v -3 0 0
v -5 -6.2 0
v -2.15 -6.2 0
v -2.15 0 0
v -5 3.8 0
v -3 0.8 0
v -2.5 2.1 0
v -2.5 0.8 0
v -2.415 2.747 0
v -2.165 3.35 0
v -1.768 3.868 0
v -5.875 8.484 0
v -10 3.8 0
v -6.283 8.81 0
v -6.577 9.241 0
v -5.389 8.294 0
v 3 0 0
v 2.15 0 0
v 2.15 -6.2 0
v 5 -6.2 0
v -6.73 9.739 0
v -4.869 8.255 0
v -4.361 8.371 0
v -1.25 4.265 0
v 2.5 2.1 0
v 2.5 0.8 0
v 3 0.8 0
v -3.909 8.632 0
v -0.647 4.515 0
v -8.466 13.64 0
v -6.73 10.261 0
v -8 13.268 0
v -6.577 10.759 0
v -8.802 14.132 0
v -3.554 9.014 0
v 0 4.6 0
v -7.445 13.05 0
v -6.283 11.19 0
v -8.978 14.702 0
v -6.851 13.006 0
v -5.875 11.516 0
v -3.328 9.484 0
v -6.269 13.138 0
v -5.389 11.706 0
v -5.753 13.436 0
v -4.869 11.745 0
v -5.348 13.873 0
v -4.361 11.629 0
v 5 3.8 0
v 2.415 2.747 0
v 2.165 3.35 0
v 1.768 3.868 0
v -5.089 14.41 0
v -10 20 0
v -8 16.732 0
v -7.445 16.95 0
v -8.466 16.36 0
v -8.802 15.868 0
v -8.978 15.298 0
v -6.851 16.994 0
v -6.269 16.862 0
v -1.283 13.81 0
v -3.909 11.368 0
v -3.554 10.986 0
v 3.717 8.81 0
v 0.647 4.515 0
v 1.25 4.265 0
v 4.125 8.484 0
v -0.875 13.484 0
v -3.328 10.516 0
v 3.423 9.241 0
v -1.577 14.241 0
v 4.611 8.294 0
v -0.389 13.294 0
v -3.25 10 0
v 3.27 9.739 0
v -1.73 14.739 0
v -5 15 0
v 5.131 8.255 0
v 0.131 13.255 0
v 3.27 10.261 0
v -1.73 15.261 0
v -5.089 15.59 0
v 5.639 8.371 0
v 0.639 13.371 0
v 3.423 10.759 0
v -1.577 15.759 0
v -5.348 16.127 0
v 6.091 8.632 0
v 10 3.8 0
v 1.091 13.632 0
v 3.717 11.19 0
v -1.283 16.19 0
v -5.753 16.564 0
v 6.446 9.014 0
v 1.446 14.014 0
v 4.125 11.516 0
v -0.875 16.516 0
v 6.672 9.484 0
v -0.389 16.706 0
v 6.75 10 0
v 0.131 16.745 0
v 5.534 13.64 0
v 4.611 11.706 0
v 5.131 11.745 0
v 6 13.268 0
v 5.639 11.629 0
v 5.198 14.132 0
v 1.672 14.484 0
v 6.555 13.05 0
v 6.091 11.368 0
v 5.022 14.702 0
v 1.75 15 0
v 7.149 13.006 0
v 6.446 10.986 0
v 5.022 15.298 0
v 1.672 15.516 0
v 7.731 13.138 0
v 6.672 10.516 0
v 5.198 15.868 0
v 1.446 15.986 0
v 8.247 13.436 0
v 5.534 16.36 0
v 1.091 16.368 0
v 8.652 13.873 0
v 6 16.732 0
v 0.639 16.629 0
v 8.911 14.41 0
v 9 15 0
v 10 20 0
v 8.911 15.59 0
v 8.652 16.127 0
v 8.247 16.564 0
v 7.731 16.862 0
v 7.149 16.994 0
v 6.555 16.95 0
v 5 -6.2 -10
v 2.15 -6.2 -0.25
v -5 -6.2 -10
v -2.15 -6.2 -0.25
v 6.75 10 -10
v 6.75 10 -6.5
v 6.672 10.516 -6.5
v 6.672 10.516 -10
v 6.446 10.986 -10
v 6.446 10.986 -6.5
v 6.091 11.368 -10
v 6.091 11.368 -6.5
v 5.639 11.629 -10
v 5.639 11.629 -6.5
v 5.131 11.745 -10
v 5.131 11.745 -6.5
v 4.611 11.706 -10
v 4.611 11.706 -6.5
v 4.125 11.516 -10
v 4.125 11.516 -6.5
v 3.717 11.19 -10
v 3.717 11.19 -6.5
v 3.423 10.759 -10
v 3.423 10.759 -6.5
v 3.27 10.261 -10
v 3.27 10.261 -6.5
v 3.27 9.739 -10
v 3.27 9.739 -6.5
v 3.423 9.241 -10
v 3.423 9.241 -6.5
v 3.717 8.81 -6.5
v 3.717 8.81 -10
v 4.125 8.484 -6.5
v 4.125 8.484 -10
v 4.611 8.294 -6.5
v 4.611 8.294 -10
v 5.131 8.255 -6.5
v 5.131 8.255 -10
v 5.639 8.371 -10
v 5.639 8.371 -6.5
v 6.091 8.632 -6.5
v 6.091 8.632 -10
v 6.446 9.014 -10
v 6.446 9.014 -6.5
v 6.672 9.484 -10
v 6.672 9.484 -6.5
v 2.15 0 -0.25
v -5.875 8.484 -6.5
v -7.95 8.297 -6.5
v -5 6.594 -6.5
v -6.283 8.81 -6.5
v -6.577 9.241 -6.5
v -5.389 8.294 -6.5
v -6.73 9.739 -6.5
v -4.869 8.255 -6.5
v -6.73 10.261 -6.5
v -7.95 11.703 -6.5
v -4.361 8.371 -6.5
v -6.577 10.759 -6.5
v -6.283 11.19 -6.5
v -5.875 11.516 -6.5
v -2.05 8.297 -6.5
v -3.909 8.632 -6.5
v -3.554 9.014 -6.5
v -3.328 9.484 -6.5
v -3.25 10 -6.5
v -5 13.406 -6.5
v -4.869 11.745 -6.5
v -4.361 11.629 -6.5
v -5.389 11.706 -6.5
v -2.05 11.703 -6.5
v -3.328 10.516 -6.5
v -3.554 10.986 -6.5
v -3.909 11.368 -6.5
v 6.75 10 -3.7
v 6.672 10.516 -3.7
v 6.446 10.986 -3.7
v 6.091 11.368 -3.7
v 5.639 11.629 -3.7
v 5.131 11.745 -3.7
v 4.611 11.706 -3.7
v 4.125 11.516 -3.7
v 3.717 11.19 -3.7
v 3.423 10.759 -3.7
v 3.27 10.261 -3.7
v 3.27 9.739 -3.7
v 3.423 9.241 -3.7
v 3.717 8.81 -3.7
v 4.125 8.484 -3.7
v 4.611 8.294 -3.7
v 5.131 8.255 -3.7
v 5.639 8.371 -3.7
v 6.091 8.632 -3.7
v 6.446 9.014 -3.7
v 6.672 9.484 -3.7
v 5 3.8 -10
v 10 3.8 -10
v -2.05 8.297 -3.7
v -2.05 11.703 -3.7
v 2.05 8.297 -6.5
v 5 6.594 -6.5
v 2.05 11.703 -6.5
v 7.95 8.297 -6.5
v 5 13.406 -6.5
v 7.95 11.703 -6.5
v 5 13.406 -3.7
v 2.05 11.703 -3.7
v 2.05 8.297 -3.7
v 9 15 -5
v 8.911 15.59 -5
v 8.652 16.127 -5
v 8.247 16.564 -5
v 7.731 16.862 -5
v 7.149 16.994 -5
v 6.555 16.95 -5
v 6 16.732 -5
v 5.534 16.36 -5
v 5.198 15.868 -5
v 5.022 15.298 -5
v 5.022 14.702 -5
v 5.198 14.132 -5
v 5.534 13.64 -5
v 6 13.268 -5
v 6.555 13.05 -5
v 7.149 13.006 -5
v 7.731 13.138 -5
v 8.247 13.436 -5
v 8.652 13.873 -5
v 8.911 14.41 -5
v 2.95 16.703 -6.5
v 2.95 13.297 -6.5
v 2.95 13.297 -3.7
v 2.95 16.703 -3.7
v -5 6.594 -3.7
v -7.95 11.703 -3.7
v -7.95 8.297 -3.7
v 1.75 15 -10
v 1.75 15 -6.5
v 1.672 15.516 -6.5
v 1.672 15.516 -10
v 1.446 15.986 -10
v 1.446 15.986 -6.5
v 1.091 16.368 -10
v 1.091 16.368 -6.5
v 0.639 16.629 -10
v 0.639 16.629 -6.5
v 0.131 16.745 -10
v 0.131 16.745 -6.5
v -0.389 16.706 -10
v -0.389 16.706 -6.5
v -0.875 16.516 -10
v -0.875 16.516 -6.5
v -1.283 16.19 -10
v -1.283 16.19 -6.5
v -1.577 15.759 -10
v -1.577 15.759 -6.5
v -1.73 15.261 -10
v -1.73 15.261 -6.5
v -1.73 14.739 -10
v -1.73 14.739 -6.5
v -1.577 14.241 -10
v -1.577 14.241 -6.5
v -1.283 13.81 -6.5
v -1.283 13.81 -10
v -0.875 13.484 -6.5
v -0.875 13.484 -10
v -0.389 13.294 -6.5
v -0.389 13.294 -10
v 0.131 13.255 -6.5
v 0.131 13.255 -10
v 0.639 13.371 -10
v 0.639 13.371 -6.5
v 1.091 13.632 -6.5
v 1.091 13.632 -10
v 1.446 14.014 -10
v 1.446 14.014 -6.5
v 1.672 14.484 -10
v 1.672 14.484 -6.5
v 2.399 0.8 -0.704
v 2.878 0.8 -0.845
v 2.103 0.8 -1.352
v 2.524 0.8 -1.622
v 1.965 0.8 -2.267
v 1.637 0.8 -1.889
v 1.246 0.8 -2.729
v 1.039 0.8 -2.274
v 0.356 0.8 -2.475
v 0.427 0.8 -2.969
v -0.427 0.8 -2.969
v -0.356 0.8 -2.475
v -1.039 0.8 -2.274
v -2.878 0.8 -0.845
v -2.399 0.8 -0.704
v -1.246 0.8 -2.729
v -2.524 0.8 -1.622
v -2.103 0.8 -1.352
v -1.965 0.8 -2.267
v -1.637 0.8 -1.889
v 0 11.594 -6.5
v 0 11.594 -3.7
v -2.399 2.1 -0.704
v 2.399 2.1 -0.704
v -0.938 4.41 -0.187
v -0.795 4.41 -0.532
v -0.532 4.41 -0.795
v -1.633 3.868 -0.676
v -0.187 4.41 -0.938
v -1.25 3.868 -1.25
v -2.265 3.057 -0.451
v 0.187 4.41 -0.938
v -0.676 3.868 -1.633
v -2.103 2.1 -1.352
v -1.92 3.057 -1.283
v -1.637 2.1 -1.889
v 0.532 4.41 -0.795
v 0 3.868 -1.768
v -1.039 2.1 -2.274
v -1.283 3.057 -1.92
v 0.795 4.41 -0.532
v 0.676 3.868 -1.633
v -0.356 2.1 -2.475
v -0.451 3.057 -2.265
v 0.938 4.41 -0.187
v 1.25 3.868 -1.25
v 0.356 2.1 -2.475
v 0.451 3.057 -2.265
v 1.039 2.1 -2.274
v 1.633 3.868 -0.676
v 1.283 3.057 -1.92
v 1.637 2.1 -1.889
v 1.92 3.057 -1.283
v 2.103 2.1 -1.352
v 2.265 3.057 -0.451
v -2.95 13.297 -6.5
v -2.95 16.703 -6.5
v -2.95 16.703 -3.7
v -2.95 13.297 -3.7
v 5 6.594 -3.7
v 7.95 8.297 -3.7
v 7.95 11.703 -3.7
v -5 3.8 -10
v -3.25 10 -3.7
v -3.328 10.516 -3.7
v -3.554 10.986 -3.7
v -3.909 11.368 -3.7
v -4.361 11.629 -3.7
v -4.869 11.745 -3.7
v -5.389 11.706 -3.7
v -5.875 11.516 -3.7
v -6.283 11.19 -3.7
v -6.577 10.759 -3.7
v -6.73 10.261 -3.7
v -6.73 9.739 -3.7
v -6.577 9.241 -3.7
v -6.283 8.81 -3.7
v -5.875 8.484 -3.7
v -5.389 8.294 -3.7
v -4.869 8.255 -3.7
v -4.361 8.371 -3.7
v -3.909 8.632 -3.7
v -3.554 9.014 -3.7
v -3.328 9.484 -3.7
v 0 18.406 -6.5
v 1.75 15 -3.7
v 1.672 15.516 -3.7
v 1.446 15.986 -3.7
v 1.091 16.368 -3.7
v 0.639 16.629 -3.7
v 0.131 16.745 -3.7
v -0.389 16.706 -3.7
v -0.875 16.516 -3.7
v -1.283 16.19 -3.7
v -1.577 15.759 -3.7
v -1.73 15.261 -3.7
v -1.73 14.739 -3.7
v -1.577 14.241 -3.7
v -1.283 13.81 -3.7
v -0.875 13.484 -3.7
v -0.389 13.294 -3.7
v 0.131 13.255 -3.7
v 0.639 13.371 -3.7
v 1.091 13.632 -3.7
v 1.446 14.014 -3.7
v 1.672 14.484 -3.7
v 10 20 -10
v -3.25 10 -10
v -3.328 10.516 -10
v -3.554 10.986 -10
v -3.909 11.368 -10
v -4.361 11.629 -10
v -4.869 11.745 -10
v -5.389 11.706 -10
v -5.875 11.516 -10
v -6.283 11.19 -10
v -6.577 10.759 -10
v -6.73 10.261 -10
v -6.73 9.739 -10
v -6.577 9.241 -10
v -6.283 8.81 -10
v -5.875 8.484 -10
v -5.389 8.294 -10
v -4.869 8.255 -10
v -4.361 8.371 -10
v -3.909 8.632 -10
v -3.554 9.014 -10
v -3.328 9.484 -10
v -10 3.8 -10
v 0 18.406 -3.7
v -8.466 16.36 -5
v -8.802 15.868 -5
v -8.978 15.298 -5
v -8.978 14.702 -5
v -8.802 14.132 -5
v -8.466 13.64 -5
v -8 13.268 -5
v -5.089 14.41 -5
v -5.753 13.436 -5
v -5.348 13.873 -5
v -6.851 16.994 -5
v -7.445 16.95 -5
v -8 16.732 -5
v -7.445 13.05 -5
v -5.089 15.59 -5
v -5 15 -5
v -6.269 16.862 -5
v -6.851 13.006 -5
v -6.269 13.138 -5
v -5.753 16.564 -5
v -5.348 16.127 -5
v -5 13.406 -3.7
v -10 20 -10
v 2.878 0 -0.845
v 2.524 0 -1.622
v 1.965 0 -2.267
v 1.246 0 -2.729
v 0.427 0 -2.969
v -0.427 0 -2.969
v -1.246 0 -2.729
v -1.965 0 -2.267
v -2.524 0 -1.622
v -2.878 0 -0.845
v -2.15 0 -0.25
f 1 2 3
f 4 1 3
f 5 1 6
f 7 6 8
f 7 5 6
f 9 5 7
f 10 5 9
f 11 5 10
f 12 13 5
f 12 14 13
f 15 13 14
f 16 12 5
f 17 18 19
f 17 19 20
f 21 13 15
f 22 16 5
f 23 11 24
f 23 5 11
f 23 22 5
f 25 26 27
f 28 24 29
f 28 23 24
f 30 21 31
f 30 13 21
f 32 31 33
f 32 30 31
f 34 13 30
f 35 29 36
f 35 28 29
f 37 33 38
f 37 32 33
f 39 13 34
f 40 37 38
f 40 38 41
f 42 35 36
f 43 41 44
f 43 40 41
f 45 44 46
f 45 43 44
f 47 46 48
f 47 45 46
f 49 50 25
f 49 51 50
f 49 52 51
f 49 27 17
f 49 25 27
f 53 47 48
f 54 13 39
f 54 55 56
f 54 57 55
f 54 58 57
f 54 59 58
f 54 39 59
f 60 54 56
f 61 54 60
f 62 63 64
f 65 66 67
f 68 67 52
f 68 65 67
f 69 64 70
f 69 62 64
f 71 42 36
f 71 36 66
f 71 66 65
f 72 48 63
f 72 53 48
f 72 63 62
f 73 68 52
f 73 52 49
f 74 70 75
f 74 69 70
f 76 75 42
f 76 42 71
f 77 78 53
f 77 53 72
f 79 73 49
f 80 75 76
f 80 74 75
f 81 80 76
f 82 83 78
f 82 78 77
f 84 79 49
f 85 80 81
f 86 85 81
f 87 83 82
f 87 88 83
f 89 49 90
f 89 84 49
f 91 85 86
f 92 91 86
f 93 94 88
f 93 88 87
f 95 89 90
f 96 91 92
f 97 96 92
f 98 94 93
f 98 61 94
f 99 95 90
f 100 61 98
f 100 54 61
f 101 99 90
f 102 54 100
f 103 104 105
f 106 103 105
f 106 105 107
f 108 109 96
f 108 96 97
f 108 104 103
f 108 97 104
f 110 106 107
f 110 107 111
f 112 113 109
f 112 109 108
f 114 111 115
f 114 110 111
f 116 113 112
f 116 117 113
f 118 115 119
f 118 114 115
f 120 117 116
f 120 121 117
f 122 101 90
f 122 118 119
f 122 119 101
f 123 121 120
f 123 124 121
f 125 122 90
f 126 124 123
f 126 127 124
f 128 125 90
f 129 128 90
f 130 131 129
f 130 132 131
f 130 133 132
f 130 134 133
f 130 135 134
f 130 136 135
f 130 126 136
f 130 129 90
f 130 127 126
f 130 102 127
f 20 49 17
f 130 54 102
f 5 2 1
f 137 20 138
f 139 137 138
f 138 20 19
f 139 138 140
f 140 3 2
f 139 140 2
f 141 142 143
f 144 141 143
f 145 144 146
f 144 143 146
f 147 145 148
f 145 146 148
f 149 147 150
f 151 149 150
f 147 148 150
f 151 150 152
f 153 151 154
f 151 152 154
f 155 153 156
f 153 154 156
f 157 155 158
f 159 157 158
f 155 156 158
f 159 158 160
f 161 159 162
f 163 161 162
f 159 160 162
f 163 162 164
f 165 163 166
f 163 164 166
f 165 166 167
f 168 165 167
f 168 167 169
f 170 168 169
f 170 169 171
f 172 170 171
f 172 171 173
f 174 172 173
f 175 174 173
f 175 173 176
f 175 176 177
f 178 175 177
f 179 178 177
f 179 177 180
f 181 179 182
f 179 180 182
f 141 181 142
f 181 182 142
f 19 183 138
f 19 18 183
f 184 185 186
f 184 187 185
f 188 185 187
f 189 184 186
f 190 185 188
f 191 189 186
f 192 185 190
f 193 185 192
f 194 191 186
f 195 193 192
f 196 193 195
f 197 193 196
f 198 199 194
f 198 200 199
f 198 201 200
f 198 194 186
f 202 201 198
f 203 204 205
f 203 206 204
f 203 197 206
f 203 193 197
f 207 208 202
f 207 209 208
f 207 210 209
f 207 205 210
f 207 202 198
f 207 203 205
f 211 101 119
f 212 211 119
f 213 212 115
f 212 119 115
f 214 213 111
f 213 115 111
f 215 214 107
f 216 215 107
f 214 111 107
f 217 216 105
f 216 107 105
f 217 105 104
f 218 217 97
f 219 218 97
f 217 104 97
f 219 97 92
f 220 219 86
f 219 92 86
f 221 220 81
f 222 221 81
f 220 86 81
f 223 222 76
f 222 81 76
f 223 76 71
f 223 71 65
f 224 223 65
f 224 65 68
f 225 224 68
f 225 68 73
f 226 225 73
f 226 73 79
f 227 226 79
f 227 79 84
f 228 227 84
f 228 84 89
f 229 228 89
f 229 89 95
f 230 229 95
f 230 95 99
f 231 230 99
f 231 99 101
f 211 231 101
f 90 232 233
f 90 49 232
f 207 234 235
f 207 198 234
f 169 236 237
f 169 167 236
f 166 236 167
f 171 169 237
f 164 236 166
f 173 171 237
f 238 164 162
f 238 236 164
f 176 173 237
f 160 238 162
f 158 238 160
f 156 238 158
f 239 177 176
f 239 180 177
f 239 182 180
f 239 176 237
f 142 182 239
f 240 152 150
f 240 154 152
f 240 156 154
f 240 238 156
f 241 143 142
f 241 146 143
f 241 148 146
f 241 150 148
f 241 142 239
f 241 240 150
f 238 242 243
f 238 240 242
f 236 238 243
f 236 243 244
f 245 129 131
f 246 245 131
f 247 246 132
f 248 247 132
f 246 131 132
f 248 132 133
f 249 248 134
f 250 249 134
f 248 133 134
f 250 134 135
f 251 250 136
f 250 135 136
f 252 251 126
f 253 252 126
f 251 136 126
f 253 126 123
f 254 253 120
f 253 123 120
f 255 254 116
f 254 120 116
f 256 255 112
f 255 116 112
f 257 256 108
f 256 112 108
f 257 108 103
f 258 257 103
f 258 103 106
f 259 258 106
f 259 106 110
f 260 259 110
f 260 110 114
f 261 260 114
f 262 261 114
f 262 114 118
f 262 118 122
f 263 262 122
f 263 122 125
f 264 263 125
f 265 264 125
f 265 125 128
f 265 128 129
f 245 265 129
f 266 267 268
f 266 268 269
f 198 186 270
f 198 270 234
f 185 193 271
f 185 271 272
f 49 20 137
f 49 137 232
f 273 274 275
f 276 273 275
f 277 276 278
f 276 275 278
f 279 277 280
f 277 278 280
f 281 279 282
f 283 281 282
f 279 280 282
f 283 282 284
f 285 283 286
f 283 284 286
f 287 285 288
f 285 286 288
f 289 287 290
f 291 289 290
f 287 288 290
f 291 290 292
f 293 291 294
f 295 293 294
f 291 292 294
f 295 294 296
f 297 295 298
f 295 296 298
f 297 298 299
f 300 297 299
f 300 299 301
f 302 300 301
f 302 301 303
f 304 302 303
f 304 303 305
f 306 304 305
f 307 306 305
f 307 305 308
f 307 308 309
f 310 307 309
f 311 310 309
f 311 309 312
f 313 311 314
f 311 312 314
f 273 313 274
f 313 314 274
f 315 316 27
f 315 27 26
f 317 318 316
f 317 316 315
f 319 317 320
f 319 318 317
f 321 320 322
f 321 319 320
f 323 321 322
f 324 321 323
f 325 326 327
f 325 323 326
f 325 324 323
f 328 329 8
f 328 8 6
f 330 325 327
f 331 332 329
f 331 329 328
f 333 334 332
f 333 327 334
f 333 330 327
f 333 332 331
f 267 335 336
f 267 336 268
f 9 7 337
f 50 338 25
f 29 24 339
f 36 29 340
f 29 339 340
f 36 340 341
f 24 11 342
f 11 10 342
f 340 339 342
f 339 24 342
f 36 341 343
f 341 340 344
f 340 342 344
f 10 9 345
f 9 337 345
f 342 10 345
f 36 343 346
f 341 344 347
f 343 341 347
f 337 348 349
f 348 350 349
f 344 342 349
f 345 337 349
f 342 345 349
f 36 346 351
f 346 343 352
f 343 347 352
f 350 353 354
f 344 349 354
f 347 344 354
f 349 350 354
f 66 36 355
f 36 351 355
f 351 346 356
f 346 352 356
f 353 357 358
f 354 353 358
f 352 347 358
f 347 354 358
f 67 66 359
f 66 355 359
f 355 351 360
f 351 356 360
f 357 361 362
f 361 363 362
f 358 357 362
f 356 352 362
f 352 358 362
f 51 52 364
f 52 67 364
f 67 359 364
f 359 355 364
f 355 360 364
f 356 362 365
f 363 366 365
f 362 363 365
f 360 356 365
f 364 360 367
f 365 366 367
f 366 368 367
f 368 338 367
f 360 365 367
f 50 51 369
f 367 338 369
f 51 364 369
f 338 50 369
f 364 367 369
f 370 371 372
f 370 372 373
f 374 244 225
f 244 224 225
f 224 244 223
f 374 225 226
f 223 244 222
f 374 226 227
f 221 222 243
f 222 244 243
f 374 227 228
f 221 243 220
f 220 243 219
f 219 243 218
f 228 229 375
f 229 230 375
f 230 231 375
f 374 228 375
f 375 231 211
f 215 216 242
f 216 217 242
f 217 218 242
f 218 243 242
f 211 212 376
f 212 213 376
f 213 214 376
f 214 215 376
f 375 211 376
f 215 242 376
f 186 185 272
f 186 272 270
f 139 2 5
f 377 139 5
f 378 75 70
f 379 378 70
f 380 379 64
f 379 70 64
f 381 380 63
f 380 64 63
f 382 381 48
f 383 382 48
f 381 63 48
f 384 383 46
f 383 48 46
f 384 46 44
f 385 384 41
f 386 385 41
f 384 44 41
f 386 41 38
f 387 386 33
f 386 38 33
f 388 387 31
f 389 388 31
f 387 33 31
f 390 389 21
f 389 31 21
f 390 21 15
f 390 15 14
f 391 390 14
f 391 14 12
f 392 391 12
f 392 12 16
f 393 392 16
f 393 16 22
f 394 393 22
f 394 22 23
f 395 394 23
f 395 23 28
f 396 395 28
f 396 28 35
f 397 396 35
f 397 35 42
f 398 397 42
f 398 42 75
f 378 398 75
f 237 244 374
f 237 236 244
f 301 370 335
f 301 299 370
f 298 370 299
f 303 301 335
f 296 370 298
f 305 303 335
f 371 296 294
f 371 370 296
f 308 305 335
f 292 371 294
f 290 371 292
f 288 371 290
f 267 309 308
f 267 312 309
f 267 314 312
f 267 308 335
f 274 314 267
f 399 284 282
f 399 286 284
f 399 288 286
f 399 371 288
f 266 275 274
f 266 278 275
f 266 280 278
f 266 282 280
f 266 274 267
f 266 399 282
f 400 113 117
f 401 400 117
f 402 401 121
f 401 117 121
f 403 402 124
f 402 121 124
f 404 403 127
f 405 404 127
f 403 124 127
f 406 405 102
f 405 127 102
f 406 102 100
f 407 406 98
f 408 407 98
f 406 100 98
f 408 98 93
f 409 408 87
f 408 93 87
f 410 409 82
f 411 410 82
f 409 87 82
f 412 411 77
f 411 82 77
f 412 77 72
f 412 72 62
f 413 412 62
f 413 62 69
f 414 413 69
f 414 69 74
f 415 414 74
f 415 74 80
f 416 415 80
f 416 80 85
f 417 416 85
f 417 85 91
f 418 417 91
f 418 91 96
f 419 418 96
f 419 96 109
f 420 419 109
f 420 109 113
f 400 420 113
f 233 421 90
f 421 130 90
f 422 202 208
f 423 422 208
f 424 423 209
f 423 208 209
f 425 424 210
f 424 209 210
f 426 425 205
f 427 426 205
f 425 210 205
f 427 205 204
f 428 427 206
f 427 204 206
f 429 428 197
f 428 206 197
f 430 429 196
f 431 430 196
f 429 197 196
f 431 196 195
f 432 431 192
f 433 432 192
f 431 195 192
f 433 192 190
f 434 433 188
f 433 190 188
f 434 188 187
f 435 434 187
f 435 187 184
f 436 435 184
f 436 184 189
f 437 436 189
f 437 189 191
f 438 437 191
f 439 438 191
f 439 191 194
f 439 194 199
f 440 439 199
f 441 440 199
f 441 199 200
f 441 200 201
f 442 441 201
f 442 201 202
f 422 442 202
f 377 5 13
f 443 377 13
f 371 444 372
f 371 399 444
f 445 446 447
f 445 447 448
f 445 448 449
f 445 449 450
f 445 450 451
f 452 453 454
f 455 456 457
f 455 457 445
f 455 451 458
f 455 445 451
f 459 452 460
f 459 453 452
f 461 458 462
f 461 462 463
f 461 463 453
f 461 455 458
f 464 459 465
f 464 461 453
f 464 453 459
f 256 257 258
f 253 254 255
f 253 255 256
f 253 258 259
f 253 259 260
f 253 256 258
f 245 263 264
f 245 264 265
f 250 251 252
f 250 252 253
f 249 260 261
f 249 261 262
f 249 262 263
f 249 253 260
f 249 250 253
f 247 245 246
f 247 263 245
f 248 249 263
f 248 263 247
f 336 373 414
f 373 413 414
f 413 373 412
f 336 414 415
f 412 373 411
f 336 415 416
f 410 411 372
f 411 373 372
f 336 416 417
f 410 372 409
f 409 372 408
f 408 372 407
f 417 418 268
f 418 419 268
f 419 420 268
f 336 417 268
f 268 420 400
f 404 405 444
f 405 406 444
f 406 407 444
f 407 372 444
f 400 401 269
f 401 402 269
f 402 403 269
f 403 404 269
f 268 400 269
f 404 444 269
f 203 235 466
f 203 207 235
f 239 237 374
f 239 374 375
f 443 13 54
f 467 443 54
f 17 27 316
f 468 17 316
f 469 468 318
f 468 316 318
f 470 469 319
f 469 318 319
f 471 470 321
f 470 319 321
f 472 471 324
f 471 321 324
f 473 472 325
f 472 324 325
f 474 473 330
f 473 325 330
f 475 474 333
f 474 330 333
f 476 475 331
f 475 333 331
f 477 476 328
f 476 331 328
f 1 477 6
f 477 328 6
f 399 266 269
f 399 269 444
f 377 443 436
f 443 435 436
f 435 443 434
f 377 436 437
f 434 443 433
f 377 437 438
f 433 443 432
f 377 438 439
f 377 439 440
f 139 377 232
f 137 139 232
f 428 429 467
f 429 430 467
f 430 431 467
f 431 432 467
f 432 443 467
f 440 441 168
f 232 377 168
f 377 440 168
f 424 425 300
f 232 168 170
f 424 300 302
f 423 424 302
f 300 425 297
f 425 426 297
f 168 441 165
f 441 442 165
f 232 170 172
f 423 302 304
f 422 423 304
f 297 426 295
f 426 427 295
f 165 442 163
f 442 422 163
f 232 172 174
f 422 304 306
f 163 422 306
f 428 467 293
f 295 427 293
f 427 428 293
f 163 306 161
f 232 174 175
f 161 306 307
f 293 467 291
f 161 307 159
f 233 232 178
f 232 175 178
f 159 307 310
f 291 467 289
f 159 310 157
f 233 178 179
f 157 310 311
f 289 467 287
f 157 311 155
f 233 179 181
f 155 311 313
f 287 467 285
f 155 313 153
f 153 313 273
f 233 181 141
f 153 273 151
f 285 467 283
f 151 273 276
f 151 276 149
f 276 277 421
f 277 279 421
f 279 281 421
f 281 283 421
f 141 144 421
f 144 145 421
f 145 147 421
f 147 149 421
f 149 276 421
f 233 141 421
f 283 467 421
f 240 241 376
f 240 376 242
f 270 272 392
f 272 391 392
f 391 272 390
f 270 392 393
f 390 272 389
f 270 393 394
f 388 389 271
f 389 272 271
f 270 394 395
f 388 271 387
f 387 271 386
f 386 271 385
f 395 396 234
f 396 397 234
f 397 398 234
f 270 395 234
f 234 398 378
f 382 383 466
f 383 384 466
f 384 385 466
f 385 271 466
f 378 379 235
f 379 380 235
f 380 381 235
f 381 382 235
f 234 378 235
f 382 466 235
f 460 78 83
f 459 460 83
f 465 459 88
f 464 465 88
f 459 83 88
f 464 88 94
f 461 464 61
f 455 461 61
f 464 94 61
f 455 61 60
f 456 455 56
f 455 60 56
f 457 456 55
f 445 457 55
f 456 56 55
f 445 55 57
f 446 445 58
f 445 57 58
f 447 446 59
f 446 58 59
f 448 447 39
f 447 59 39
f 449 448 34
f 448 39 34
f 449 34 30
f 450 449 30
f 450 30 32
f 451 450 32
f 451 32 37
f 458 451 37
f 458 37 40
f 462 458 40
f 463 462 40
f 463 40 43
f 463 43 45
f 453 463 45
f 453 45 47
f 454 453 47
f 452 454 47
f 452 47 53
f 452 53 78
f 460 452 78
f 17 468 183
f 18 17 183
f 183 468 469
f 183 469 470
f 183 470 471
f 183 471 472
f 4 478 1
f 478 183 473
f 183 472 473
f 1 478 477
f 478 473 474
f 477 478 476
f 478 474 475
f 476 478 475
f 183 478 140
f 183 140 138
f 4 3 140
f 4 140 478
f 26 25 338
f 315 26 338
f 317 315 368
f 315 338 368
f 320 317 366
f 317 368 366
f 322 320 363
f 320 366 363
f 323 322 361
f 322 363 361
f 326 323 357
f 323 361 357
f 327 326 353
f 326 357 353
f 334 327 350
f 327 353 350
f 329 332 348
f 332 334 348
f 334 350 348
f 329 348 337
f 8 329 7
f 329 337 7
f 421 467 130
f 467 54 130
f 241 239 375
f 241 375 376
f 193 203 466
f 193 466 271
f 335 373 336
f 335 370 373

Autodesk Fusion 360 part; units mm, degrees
sketch "Skizze1" plane through (0, 0, 0) normal (0, 0, 1) x (1, 0, 0)
  line L0 (-3, 0) -> (-3, 0.8)
  line L1 (-3, 0.8) -> (-2.5, 0.8)
  line L2 (-2.5, 0.8) -> (-2.5, 2.1)
  line L3 (-8.4843, 2.1) -> (11.6981, 2.1) construction
  line L4 (0, 9) -> (0, -6.2163) construction
  arc A0 (0, 4.6) -> (-2.5, 2.1) centre (0, 2.1) ccw
  line L5 (0, 4.6) -> (0, 0)
  line L6 (0, 0) -> (-3, 0)
  line L7 (2.5, 2) -> (4.5, 2)
  line L8 (4.5, 2) -> (4.5, -2)
  line L9 (4.5, -2) -> (2.5, -2)
  line L10 (2.5, -2) -> (2.5, 2)
  line L11 (-4.5, 2) -> (-2.5, 2)
  line L12 (-2.5, 2) -> (-2.5, -2)
  line L13 (-2.5, -2) -> (-4.5, -2)
  line L14 (-4.5, -2) -> (-4.5, 2)
  point P0 (0, 2.1)
  dimension "d1" = 3
  dimension "d2" = 0.8
  dimension "d3" = 2.5
  dimension "d7" = 2.5
  dimension "d8" = 2
  dimension "d9" = 2
  dimension "d10" = 2
  dimension "d117" = 2.5
  dimension "d119" = 2
  dimension "d120" = 2
  dimension "d121" = 2
  dimension "d122" = 2.1
  dimension "d123" = 4.6
revolve "Drehen1" add sketch "Skizze1" angle 360 about axis through (0, 9, 0) along (0, -1, 0) contours L0 L1 L6 L12 | L2 A0 L5 L6 L12 makes body 1
sketch "Skizze2" plane through (0, 0, 0) normal (0, 0, 1) x (1, 0, 0)
  line L0 (-10, 20) -> (10, 20)
  line L1 (10, 20) -> (10, -6.2)
  line L2 (10, -6.2) -> (-10, -6.2)
  line L3 (-10, -6.2) -> (-10, 20)
  line L4 (0, 21.3723) -> (0, -17) construction
  line L5 (-26.2349, 0) -> (38.3962, 0) construction
  line L6 (5, -6.2) -> (5, 3.8)
  line L7 (5, 3.8) -> (10, 3.8)
  line L8 (-5, -6.2) -> (-5, 3.8)
  line L9 (-5, 3.8) -> (-10, 3.8)
  line L10 (-17, 10) -> (24.4562, 10) construction
  line L11 (-5, 26) -> (-5, 5) construction
  line L12 (5, 25.6741) -> (5, 5) construction
  circle A0 centre (-5, 10) radius 1.75
  circle A1 centre (5, 10) radius 1.75
  line L13 (-16, 15) -> (36.57, 15) construction
  circle A2 centre (0, 15) radius 1.75
  line L14 (-7, 22.2425) -> (-7, -4.6464) construction
  line L15 (7, 22.2425) -> (7, -3.3633) construction
  circle A3 centre (-7, 15) radius 2
  circle A4 centre (7, 15) radius 2
  dimension "d13" = 10
  dimension "d14" = 10
  dimension "d15" = 6.2
  dimension "d16" = 20
  dimension "d32" = 5
  dimension "d33" = 10
  dimension "d34" = 5
  dimension "d35" = 10
  dimension "d36" = 10
  dimension "d37" = 5
  dimension "d38" = 5
  dimension "d39" = 3.5
  dimension "d40" = 3.5
  dimension "d41" = 5
  dimension "d42" = 3.5
  dimension "d53" = 7
  dimension "d54" = 7
extrude "Extrusion2" add sketch "Skizze2" against normal blind 10 separate body contours L0 L1 L2 L3 L6 L7 L8 L9 | A3 | A4 makes body 2
extrude "Extrusion7" cut sketch "Skizze2" against normal blind 5 contours A3 | A4 bodies 2
combine "Kombinieren1" operation cut target body 2 tool bodies 1
sketch "Skizze4" plane through (0, 0, 0) normal (0, 0, 1) x (1, 0, 0)
  line L0 (2.15, -6.2) -> (-2.15, -6.2)
  line L1 (-2.15, -6.2) -> (-2.15, 0)
  line L2 (-2.15, 0) -> (2.15, 0)
  line L3 (2.15, 0) -> (2.15, -6.2)
  line L4 (2.15, -6.2) -> (-2.15, 0) construction
  line L5 (-2.15, -6.2) -> (2.15, 0) construction
  line L6 (0, 9.7025) -> (0, -8.7035) construction
  line L7 (-7.2352, -6.2) -> (6.1757, -6.2) construction
  point P0 (0, -3.1)
  point P1 (0, -6.2)
  dimension "d21" = 4.3
  dimension "d22" = 6.2
extrude "Extrusion4" cut sketch "Skizze4" against normal blind 0.25 bodies 2
ref_plane "Arbeitsebene1" through (0, 0, -6.5) normal (0, 0, 1) x (1, 0, 0)
sketch "Skizze7" plane through (0, 0, -6.5) normal (0, 0, 1) x (1, 0, 0)
  line L0 (-16.0259, 10) -> (20, 10) construction
  line L1 (-5, 21.68) -> (-5, -11.619) construction
  line L2 (5, 22.2413) -> (5, -12.5543) construction
  line L3 (-2.05, 11.7032) -> (-5, 13.4064)
  line L4 (-5, 13.4064) -> (-7.95, 11.7032)
  line L5 (-7.95, 11.7032) -> (-7.95, 8.2968)
  line L6 (-7.95, 8.2968) -> (-5, 6.5936)
  line L7 (-5, 6.5936) -> (-2.05, 8.2968)
  line L8 (-2.05, 8.2968) -> (-2.05, 11.7032)
  line L9 (7.95, 11.7032) -> (5, 13.4064)
  line L10 (5, 13.4064) -> (2.05, 11.7032)
  line L11 (2.05, 11.7032) -> (2.05, 8.2968)
  line L12 (2.05, 8.2968) -> (5, 6.5936)
  line L13 (5, 6.5936) -> (7.95, 8.2968)
  line L14 (7.95, 8.2968) -> (7.95, 11.7032)
  line L15 (-15.7752, 15) -> (18.7006, 15) construction
  line L16 (0, 22.633) -> (0, -9.7229) construction
  line L17 (2.95, 16.7032) -> (0, 18.4064)
  line L18 (0, 18.4064) -> (-2.95, 16.7032)
  line L19 (-2.95, 16.7032) -> (-2.95, 13.2968)
  line L20 (-2.95, 13.2968) -> (0, 11.5936)
  line L21 (0, 11.5936) -> (2.95, 13.2968)
  line L22 (2.95, 13.2968) -> (2.95, 16.7032)
  point P0 (-5, 10)
  point P1 (5, 10)
  point P2 (-5, 10)
  point P3 (5, 10)
  point P4 (0, 15)
  point P5 (0, 15)
  dimension "d44" = 10
  dimension "d45" = 5
  dimension "d46" = 5
  dimension "d47" = 5.9
  dimension "d48" = 5.9
  dimension "d51" = 15
  dimension "d52" = 5.9
extrude "Extrusion6" cut sketch "Skizze7" along normal blind 2.8 bodies 2
equation "d3 = d"
equation "d7 = d"
equation "d117 = d"
equation "d = 2.5 mm"
equation "d122 = 4.6 mm - d"
